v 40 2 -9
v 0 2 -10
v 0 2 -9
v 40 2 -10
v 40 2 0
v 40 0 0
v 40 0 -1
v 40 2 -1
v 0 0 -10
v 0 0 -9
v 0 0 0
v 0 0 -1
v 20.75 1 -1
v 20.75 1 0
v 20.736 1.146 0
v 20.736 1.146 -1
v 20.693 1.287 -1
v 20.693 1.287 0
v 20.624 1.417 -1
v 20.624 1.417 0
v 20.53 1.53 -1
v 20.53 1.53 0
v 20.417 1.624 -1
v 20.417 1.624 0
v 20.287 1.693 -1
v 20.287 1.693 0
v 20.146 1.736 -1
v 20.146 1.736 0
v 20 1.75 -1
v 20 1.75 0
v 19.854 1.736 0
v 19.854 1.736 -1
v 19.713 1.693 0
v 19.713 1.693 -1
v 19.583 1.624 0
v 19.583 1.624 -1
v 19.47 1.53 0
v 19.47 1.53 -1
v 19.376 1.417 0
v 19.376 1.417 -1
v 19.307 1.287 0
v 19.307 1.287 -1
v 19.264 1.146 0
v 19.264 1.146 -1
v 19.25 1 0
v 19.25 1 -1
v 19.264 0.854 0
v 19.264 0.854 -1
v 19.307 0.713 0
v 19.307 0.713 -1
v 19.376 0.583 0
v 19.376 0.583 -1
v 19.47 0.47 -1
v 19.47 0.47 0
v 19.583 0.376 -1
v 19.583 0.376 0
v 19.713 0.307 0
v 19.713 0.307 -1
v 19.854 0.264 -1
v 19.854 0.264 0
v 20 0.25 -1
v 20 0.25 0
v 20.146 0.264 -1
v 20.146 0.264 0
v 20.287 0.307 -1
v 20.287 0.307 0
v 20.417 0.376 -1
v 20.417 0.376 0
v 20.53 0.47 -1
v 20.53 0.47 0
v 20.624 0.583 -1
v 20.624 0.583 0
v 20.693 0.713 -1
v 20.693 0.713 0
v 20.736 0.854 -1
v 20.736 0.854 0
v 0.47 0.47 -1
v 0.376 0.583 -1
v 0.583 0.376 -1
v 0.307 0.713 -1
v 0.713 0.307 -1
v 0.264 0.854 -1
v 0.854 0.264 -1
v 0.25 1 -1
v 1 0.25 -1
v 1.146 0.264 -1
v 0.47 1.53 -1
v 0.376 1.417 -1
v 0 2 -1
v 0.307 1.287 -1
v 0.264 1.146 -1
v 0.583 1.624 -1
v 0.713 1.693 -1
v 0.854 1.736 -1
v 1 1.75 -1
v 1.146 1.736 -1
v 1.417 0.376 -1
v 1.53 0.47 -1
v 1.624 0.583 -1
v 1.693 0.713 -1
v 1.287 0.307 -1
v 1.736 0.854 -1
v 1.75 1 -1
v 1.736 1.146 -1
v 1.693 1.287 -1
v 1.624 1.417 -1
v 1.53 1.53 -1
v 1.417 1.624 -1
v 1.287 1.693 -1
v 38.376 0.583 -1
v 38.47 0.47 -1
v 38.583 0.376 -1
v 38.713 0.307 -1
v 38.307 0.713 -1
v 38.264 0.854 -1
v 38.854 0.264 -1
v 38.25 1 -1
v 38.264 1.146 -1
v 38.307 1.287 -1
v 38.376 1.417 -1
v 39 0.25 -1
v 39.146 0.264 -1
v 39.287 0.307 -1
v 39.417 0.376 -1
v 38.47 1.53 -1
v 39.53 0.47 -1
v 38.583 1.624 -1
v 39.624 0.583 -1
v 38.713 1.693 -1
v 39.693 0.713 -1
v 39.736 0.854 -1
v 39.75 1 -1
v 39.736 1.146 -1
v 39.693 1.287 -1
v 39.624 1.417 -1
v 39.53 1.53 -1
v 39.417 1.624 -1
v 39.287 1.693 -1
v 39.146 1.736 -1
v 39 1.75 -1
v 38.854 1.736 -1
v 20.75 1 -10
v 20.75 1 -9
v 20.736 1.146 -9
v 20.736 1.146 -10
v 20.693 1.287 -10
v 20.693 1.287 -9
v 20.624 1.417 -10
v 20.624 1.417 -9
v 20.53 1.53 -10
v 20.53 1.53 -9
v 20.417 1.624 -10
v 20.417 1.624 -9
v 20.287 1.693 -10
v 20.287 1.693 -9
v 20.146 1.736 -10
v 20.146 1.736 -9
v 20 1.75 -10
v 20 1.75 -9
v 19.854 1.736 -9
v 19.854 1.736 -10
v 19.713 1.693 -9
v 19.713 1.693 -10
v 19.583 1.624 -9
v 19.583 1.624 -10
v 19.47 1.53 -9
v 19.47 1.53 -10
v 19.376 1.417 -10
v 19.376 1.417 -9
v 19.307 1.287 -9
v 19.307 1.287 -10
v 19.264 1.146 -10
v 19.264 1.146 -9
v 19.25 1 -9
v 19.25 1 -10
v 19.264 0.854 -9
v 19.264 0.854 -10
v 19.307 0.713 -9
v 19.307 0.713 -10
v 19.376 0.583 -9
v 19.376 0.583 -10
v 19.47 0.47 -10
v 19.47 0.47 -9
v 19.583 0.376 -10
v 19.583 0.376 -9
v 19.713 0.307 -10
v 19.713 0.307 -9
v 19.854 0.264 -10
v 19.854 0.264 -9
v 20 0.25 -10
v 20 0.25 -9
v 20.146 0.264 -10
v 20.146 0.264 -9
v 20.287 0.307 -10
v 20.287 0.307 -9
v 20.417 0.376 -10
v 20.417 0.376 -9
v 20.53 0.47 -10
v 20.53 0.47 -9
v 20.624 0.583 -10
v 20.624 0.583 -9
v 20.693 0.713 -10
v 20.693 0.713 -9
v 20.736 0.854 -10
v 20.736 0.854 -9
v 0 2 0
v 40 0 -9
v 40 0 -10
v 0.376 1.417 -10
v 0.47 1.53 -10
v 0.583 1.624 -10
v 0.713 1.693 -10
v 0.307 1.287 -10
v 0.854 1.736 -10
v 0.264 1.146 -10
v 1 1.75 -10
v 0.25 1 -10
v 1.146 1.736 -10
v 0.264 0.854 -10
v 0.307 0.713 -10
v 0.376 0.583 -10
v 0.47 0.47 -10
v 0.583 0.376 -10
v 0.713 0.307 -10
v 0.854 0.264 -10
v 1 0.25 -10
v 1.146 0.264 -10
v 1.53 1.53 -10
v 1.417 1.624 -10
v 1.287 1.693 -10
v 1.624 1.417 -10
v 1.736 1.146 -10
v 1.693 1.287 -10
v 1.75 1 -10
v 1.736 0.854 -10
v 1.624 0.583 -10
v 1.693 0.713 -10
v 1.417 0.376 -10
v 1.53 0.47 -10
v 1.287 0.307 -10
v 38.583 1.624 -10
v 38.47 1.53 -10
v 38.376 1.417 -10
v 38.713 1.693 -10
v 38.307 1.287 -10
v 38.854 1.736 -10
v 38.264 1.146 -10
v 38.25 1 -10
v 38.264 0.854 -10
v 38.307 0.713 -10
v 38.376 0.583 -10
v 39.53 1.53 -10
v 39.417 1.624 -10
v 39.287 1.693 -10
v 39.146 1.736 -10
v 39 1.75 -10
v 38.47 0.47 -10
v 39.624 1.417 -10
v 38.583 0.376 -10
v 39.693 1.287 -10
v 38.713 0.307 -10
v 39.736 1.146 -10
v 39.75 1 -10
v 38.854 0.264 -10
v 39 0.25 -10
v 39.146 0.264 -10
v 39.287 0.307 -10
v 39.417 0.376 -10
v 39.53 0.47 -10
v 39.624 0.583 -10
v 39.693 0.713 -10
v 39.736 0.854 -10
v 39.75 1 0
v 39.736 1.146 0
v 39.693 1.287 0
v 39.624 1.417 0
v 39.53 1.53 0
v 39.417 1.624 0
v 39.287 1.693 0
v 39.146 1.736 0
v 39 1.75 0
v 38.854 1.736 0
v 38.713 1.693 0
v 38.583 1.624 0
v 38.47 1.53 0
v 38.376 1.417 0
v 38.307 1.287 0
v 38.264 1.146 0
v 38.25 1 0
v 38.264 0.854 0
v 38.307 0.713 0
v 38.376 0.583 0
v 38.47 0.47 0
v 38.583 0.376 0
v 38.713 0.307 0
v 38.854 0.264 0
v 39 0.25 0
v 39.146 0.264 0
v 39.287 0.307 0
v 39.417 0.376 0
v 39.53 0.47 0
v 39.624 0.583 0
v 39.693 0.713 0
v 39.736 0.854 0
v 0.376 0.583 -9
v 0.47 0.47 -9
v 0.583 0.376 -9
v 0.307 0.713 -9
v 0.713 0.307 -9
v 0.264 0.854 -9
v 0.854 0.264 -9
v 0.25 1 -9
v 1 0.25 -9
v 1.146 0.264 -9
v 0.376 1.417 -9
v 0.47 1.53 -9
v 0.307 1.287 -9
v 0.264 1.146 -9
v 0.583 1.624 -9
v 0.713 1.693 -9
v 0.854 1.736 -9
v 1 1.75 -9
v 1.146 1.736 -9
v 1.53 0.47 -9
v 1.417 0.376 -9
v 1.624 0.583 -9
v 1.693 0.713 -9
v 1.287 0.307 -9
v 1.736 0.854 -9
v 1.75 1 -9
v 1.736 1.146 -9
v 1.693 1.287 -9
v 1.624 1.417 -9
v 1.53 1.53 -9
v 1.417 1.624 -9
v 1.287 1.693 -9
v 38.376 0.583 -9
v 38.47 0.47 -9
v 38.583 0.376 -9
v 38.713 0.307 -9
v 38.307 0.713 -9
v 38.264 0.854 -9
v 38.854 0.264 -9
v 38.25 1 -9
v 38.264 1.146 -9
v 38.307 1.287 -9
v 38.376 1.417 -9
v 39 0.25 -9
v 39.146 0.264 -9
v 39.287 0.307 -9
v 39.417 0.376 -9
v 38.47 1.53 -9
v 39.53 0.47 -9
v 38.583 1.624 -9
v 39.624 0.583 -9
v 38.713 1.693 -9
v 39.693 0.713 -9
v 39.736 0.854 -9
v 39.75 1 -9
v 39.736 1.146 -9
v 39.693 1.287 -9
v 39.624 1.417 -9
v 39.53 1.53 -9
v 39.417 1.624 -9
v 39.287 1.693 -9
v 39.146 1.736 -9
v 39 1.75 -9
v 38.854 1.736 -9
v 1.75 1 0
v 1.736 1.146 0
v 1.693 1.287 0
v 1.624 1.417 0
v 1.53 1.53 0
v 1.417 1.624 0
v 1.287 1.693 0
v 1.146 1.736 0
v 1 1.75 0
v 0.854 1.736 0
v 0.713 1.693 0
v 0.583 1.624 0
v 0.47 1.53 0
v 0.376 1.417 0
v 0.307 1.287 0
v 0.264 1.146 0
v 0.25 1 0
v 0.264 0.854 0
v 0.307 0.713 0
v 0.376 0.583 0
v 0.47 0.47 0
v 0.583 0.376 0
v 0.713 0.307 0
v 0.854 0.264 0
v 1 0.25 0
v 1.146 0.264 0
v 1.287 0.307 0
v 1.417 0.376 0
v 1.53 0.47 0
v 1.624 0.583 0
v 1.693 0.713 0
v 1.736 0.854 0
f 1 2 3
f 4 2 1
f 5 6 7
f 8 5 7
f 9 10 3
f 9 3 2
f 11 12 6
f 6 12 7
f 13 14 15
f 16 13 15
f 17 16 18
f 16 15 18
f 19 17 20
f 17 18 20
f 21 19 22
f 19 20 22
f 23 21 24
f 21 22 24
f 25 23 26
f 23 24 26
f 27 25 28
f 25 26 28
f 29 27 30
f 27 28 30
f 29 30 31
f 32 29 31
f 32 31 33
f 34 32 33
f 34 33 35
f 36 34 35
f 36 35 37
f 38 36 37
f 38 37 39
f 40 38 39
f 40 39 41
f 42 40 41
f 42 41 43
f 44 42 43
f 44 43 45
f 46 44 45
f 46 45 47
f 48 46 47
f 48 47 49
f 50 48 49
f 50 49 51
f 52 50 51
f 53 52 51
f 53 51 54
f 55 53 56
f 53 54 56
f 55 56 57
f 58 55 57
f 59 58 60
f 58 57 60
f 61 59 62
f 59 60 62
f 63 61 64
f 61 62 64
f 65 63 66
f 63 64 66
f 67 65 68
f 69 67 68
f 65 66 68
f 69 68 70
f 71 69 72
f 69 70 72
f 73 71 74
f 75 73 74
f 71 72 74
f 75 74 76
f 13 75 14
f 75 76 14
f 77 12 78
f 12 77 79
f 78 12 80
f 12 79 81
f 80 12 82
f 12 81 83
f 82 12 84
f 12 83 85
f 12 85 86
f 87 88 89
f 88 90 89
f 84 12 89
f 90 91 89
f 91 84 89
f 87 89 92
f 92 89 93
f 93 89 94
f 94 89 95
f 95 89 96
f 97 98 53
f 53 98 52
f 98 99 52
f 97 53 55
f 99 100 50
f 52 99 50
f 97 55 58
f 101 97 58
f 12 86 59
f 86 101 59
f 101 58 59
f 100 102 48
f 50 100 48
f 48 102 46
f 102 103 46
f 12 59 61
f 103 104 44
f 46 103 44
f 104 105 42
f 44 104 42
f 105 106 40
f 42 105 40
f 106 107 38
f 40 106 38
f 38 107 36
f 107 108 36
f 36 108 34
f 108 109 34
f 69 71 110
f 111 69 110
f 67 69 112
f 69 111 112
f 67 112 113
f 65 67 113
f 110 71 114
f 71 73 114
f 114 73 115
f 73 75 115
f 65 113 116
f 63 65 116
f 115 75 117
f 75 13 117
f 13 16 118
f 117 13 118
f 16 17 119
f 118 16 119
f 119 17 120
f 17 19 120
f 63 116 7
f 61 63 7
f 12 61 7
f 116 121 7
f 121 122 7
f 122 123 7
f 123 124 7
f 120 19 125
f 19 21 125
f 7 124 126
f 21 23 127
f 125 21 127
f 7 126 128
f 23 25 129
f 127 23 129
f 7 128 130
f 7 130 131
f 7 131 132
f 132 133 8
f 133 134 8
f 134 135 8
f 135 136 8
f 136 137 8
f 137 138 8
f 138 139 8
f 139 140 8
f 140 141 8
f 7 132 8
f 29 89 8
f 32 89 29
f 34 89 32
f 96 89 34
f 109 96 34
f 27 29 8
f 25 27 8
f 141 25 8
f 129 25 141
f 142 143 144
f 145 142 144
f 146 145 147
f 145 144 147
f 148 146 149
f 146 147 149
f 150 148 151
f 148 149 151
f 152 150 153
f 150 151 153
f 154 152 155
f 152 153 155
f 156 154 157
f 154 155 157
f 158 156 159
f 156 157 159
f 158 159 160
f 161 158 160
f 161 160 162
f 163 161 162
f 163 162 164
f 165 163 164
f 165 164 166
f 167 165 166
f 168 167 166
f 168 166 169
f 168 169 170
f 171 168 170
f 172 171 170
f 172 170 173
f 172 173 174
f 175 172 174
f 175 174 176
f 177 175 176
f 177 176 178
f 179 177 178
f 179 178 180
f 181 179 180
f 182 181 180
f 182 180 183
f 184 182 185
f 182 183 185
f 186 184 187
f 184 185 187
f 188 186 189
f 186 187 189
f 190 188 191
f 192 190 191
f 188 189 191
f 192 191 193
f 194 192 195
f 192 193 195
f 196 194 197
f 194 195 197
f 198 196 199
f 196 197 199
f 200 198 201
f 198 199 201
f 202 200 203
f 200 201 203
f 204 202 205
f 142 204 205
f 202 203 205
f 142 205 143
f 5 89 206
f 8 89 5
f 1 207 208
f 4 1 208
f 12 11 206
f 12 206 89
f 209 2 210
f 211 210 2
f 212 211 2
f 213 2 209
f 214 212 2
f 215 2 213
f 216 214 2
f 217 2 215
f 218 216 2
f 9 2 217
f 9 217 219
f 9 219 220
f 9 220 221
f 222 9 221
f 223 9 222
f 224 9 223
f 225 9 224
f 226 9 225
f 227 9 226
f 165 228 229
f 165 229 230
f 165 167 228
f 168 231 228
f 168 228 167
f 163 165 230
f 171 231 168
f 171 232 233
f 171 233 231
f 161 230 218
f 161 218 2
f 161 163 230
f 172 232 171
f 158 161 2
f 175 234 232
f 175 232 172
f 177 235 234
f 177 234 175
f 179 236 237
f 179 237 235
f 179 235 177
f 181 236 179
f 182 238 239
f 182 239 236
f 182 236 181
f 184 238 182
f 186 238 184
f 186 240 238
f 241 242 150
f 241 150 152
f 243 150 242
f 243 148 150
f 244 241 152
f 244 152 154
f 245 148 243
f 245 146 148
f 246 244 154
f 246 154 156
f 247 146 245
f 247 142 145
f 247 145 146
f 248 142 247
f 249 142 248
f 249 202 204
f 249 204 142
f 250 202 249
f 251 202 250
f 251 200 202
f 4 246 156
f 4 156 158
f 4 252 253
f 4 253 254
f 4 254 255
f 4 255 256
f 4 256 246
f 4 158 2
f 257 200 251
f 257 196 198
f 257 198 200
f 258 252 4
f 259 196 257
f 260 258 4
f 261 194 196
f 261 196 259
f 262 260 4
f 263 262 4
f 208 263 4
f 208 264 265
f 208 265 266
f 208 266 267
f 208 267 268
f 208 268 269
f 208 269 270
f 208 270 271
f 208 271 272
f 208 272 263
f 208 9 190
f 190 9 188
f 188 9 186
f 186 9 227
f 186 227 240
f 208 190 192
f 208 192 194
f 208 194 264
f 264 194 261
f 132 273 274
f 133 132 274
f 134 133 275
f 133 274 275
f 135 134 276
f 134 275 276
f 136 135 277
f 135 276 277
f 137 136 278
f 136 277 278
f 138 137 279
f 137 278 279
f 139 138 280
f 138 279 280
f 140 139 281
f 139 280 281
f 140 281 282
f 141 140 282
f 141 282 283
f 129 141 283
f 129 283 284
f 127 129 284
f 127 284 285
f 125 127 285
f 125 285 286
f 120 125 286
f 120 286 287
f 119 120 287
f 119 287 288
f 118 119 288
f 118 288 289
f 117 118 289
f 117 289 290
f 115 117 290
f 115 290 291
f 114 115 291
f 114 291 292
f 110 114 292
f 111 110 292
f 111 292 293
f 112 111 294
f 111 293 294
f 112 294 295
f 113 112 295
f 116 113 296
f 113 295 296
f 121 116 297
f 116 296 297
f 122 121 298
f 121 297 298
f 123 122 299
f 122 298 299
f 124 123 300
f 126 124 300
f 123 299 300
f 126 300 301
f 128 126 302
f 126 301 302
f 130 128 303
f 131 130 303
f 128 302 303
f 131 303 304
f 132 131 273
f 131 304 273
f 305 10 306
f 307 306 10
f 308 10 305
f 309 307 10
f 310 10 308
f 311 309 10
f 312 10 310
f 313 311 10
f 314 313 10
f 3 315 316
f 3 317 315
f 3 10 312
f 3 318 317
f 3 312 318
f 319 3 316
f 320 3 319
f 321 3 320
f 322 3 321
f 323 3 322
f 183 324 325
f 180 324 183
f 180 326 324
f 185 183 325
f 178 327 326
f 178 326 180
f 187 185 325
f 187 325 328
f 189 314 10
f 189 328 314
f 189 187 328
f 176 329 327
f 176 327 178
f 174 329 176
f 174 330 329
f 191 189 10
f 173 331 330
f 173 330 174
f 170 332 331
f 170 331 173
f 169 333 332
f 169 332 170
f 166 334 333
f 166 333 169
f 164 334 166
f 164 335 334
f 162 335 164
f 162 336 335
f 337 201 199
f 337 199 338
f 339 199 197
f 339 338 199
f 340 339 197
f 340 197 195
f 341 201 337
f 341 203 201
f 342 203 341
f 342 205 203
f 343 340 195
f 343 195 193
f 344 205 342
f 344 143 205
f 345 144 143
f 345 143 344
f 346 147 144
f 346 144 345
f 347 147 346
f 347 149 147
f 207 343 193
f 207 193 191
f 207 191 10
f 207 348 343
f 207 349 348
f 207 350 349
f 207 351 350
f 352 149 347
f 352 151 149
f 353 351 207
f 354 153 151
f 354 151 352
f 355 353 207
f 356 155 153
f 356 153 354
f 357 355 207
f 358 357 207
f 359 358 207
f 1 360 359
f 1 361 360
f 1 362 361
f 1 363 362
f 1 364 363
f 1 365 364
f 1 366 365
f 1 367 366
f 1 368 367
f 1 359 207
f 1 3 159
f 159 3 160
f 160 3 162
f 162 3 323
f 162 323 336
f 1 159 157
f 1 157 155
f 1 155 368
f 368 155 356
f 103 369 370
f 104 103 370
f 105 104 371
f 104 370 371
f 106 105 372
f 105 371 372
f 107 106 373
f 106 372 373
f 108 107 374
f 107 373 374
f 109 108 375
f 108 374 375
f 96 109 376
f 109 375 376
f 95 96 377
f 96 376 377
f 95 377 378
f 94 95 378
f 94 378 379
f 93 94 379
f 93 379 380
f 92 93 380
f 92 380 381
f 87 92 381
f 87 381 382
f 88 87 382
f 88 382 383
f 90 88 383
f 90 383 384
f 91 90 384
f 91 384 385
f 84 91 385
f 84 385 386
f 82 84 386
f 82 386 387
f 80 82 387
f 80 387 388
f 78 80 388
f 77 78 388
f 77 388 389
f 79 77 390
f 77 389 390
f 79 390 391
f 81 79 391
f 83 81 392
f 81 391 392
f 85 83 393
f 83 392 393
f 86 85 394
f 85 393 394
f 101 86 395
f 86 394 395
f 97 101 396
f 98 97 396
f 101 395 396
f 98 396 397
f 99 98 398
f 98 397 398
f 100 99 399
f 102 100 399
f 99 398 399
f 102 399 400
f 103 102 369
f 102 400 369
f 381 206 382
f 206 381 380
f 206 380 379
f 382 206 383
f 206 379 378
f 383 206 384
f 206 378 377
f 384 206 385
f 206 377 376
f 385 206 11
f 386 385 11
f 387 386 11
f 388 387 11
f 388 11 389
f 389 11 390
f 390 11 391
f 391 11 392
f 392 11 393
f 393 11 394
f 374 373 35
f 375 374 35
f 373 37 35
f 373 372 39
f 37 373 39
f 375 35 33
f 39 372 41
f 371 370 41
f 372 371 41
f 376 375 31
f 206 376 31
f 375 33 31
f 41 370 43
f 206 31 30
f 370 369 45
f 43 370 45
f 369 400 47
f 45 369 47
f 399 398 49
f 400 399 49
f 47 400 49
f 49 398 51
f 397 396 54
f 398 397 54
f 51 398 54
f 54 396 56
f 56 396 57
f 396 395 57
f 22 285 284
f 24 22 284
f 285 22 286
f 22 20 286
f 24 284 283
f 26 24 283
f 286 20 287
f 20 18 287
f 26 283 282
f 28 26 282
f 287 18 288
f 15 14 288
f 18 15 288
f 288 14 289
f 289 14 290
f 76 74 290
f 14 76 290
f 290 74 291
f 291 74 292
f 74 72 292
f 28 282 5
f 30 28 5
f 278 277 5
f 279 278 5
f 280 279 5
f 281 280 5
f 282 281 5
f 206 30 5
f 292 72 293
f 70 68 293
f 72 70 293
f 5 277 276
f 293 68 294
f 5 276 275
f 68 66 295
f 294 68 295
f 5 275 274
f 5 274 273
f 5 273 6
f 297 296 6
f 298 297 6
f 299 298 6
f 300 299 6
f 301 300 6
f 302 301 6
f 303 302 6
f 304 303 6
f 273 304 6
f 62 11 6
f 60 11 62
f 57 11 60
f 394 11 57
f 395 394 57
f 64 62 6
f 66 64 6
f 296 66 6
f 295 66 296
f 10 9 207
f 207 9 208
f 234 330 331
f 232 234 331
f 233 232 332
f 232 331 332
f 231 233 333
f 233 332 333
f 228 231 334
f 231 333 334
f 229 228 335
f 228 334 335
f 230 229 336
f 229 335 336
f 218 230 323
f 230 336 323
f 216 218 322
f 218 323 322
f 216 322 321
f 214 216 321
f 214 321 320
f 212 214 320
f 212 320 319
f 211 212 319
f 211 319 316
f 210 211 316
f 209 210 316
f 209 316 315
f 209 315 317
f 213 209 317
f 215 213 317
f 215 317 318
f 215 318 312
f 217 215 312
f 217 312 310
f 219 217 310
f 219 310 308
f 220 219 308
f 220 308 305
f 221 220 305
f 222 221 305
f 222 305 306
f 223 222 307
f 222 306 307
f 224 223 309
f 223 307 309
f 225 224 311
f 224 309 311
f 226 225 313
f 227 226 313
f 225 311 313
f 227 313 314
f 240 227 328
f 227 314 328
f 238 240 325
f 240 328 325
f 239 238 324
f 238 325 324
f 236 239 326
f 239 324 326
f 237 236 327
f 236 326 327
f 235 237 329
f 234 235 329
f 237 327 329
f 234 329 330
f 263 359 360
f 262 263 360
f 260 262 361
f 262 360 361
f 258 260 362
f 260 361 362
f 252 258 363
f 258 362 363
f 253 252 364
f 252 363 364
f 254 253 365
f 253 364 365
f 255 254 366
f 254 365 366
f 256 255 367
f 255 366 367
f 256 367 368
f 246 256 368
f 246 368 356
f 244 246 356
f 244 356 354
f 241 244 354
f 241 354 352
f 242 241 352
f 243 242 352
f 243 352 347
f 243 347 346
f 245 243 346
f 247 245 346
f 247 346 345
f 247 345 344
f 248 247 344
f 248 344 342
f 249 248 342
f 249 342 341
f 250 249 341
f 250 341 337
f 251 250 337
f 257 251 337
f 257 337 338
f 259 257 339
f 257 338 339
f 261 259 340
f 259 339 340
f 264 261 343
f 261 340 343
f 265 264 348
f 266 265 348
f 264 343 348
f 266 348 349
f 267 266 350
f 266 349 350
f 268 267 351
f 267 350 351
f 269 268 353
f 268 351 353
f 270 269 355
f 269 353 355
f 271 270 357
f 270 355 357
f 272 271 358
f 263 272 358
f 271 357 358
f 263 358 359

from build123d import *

# Parameters (mm, degrees)
SKETCH1_W           = 40
SKETCH1_H           = 10
BOSS_EXTRUDE1_DEPTH = 2
SKETCH4_W           = 40
SKETCH4_H           = 8
CUT_EXTRUDE2_DEPTH  = 2
SKETCH5_R           = 0.75
CUT_EXTRUDE3_DEPTH  = 42.279534881


with BuildPart() as part:
    # Sketch1 → Boss-Extrude1 (new body)
    with BuildSketch(Plane(origin=(0, 0, 0), x_dir=(1, 0, 0), z_dir=(0, 1, 0))):
        with Locations((20, 5)):
            Rectangle(SKETCH1_W, SKETCH1_H)
    extrude(amount=BOSS_EXTRUDE1_DEPTH)

    # Sketch4 → Cut-Extrude2 (cut)
    with BuildSketch(Plane(origin=(0, 2, 0), x_dir=(1, 0, 0), z_dir=(0, 1, 0))):
        with Locations((20, 5)):
            Rectangle(SKETCH4_W, SKETCH4_H)
    extrude(amount=-CUT_EXTRUDE2_DEPTH, mode=Mode.SUBTRACT)


with BuildPart() as cut_extrude2_piece_1:
    # of the separate pieces the step leaves, piece 1, a body of its own (cut_extrude2_pieces)
    add(part.part.solids().sort_by_distance((0, 0, 0))[0])


with BuildPart() as cut_extrude2_piece_2:
    # of the separate pieces the step leaves, piece 2, a body of its own (cut_extrude2_pieces)
    add(part.part.solids().sort_by_distance((0, 0, -10))[0])


with BuildPart() as cut_extrude3_tool:
    # Sketch5 → Cut-Extrude3 (new, through all)
    with BuildSketch(Plane.XY):
        with Locations((20, 1)):
            Circle(SKETCH5_R)
        with Locations((1, 1)):
            Circle(SKETCH5_R)
        with Locations((39, 1)):
            Circle(SKETCH5_R)
    extrude(amount=-CUT_EXTRUDE3_DEPTH)


with BuildPart() as cut_extrude2_piece_1_1:
    add(cut_extrude2_piece_1.part)

    # Cut-Extrude3: cut by cut_extrude3_tool
    add(cut_extrude3_tool.part, mode=Mode.SUBTRACT)


with BuildPart() as cut_extrude2_piece_2_1:
    add(cut_extrude2_piece_2.part)

    # Cut-Extrude3: cut by cut_extrude3_tool
    add(cut_extrude3_tool.part, mode=Mode.SUBTRACT)


solid = Compound([cut_extrude2_piece_1_1.part, cut_extrude2_piece_2_1.part])
